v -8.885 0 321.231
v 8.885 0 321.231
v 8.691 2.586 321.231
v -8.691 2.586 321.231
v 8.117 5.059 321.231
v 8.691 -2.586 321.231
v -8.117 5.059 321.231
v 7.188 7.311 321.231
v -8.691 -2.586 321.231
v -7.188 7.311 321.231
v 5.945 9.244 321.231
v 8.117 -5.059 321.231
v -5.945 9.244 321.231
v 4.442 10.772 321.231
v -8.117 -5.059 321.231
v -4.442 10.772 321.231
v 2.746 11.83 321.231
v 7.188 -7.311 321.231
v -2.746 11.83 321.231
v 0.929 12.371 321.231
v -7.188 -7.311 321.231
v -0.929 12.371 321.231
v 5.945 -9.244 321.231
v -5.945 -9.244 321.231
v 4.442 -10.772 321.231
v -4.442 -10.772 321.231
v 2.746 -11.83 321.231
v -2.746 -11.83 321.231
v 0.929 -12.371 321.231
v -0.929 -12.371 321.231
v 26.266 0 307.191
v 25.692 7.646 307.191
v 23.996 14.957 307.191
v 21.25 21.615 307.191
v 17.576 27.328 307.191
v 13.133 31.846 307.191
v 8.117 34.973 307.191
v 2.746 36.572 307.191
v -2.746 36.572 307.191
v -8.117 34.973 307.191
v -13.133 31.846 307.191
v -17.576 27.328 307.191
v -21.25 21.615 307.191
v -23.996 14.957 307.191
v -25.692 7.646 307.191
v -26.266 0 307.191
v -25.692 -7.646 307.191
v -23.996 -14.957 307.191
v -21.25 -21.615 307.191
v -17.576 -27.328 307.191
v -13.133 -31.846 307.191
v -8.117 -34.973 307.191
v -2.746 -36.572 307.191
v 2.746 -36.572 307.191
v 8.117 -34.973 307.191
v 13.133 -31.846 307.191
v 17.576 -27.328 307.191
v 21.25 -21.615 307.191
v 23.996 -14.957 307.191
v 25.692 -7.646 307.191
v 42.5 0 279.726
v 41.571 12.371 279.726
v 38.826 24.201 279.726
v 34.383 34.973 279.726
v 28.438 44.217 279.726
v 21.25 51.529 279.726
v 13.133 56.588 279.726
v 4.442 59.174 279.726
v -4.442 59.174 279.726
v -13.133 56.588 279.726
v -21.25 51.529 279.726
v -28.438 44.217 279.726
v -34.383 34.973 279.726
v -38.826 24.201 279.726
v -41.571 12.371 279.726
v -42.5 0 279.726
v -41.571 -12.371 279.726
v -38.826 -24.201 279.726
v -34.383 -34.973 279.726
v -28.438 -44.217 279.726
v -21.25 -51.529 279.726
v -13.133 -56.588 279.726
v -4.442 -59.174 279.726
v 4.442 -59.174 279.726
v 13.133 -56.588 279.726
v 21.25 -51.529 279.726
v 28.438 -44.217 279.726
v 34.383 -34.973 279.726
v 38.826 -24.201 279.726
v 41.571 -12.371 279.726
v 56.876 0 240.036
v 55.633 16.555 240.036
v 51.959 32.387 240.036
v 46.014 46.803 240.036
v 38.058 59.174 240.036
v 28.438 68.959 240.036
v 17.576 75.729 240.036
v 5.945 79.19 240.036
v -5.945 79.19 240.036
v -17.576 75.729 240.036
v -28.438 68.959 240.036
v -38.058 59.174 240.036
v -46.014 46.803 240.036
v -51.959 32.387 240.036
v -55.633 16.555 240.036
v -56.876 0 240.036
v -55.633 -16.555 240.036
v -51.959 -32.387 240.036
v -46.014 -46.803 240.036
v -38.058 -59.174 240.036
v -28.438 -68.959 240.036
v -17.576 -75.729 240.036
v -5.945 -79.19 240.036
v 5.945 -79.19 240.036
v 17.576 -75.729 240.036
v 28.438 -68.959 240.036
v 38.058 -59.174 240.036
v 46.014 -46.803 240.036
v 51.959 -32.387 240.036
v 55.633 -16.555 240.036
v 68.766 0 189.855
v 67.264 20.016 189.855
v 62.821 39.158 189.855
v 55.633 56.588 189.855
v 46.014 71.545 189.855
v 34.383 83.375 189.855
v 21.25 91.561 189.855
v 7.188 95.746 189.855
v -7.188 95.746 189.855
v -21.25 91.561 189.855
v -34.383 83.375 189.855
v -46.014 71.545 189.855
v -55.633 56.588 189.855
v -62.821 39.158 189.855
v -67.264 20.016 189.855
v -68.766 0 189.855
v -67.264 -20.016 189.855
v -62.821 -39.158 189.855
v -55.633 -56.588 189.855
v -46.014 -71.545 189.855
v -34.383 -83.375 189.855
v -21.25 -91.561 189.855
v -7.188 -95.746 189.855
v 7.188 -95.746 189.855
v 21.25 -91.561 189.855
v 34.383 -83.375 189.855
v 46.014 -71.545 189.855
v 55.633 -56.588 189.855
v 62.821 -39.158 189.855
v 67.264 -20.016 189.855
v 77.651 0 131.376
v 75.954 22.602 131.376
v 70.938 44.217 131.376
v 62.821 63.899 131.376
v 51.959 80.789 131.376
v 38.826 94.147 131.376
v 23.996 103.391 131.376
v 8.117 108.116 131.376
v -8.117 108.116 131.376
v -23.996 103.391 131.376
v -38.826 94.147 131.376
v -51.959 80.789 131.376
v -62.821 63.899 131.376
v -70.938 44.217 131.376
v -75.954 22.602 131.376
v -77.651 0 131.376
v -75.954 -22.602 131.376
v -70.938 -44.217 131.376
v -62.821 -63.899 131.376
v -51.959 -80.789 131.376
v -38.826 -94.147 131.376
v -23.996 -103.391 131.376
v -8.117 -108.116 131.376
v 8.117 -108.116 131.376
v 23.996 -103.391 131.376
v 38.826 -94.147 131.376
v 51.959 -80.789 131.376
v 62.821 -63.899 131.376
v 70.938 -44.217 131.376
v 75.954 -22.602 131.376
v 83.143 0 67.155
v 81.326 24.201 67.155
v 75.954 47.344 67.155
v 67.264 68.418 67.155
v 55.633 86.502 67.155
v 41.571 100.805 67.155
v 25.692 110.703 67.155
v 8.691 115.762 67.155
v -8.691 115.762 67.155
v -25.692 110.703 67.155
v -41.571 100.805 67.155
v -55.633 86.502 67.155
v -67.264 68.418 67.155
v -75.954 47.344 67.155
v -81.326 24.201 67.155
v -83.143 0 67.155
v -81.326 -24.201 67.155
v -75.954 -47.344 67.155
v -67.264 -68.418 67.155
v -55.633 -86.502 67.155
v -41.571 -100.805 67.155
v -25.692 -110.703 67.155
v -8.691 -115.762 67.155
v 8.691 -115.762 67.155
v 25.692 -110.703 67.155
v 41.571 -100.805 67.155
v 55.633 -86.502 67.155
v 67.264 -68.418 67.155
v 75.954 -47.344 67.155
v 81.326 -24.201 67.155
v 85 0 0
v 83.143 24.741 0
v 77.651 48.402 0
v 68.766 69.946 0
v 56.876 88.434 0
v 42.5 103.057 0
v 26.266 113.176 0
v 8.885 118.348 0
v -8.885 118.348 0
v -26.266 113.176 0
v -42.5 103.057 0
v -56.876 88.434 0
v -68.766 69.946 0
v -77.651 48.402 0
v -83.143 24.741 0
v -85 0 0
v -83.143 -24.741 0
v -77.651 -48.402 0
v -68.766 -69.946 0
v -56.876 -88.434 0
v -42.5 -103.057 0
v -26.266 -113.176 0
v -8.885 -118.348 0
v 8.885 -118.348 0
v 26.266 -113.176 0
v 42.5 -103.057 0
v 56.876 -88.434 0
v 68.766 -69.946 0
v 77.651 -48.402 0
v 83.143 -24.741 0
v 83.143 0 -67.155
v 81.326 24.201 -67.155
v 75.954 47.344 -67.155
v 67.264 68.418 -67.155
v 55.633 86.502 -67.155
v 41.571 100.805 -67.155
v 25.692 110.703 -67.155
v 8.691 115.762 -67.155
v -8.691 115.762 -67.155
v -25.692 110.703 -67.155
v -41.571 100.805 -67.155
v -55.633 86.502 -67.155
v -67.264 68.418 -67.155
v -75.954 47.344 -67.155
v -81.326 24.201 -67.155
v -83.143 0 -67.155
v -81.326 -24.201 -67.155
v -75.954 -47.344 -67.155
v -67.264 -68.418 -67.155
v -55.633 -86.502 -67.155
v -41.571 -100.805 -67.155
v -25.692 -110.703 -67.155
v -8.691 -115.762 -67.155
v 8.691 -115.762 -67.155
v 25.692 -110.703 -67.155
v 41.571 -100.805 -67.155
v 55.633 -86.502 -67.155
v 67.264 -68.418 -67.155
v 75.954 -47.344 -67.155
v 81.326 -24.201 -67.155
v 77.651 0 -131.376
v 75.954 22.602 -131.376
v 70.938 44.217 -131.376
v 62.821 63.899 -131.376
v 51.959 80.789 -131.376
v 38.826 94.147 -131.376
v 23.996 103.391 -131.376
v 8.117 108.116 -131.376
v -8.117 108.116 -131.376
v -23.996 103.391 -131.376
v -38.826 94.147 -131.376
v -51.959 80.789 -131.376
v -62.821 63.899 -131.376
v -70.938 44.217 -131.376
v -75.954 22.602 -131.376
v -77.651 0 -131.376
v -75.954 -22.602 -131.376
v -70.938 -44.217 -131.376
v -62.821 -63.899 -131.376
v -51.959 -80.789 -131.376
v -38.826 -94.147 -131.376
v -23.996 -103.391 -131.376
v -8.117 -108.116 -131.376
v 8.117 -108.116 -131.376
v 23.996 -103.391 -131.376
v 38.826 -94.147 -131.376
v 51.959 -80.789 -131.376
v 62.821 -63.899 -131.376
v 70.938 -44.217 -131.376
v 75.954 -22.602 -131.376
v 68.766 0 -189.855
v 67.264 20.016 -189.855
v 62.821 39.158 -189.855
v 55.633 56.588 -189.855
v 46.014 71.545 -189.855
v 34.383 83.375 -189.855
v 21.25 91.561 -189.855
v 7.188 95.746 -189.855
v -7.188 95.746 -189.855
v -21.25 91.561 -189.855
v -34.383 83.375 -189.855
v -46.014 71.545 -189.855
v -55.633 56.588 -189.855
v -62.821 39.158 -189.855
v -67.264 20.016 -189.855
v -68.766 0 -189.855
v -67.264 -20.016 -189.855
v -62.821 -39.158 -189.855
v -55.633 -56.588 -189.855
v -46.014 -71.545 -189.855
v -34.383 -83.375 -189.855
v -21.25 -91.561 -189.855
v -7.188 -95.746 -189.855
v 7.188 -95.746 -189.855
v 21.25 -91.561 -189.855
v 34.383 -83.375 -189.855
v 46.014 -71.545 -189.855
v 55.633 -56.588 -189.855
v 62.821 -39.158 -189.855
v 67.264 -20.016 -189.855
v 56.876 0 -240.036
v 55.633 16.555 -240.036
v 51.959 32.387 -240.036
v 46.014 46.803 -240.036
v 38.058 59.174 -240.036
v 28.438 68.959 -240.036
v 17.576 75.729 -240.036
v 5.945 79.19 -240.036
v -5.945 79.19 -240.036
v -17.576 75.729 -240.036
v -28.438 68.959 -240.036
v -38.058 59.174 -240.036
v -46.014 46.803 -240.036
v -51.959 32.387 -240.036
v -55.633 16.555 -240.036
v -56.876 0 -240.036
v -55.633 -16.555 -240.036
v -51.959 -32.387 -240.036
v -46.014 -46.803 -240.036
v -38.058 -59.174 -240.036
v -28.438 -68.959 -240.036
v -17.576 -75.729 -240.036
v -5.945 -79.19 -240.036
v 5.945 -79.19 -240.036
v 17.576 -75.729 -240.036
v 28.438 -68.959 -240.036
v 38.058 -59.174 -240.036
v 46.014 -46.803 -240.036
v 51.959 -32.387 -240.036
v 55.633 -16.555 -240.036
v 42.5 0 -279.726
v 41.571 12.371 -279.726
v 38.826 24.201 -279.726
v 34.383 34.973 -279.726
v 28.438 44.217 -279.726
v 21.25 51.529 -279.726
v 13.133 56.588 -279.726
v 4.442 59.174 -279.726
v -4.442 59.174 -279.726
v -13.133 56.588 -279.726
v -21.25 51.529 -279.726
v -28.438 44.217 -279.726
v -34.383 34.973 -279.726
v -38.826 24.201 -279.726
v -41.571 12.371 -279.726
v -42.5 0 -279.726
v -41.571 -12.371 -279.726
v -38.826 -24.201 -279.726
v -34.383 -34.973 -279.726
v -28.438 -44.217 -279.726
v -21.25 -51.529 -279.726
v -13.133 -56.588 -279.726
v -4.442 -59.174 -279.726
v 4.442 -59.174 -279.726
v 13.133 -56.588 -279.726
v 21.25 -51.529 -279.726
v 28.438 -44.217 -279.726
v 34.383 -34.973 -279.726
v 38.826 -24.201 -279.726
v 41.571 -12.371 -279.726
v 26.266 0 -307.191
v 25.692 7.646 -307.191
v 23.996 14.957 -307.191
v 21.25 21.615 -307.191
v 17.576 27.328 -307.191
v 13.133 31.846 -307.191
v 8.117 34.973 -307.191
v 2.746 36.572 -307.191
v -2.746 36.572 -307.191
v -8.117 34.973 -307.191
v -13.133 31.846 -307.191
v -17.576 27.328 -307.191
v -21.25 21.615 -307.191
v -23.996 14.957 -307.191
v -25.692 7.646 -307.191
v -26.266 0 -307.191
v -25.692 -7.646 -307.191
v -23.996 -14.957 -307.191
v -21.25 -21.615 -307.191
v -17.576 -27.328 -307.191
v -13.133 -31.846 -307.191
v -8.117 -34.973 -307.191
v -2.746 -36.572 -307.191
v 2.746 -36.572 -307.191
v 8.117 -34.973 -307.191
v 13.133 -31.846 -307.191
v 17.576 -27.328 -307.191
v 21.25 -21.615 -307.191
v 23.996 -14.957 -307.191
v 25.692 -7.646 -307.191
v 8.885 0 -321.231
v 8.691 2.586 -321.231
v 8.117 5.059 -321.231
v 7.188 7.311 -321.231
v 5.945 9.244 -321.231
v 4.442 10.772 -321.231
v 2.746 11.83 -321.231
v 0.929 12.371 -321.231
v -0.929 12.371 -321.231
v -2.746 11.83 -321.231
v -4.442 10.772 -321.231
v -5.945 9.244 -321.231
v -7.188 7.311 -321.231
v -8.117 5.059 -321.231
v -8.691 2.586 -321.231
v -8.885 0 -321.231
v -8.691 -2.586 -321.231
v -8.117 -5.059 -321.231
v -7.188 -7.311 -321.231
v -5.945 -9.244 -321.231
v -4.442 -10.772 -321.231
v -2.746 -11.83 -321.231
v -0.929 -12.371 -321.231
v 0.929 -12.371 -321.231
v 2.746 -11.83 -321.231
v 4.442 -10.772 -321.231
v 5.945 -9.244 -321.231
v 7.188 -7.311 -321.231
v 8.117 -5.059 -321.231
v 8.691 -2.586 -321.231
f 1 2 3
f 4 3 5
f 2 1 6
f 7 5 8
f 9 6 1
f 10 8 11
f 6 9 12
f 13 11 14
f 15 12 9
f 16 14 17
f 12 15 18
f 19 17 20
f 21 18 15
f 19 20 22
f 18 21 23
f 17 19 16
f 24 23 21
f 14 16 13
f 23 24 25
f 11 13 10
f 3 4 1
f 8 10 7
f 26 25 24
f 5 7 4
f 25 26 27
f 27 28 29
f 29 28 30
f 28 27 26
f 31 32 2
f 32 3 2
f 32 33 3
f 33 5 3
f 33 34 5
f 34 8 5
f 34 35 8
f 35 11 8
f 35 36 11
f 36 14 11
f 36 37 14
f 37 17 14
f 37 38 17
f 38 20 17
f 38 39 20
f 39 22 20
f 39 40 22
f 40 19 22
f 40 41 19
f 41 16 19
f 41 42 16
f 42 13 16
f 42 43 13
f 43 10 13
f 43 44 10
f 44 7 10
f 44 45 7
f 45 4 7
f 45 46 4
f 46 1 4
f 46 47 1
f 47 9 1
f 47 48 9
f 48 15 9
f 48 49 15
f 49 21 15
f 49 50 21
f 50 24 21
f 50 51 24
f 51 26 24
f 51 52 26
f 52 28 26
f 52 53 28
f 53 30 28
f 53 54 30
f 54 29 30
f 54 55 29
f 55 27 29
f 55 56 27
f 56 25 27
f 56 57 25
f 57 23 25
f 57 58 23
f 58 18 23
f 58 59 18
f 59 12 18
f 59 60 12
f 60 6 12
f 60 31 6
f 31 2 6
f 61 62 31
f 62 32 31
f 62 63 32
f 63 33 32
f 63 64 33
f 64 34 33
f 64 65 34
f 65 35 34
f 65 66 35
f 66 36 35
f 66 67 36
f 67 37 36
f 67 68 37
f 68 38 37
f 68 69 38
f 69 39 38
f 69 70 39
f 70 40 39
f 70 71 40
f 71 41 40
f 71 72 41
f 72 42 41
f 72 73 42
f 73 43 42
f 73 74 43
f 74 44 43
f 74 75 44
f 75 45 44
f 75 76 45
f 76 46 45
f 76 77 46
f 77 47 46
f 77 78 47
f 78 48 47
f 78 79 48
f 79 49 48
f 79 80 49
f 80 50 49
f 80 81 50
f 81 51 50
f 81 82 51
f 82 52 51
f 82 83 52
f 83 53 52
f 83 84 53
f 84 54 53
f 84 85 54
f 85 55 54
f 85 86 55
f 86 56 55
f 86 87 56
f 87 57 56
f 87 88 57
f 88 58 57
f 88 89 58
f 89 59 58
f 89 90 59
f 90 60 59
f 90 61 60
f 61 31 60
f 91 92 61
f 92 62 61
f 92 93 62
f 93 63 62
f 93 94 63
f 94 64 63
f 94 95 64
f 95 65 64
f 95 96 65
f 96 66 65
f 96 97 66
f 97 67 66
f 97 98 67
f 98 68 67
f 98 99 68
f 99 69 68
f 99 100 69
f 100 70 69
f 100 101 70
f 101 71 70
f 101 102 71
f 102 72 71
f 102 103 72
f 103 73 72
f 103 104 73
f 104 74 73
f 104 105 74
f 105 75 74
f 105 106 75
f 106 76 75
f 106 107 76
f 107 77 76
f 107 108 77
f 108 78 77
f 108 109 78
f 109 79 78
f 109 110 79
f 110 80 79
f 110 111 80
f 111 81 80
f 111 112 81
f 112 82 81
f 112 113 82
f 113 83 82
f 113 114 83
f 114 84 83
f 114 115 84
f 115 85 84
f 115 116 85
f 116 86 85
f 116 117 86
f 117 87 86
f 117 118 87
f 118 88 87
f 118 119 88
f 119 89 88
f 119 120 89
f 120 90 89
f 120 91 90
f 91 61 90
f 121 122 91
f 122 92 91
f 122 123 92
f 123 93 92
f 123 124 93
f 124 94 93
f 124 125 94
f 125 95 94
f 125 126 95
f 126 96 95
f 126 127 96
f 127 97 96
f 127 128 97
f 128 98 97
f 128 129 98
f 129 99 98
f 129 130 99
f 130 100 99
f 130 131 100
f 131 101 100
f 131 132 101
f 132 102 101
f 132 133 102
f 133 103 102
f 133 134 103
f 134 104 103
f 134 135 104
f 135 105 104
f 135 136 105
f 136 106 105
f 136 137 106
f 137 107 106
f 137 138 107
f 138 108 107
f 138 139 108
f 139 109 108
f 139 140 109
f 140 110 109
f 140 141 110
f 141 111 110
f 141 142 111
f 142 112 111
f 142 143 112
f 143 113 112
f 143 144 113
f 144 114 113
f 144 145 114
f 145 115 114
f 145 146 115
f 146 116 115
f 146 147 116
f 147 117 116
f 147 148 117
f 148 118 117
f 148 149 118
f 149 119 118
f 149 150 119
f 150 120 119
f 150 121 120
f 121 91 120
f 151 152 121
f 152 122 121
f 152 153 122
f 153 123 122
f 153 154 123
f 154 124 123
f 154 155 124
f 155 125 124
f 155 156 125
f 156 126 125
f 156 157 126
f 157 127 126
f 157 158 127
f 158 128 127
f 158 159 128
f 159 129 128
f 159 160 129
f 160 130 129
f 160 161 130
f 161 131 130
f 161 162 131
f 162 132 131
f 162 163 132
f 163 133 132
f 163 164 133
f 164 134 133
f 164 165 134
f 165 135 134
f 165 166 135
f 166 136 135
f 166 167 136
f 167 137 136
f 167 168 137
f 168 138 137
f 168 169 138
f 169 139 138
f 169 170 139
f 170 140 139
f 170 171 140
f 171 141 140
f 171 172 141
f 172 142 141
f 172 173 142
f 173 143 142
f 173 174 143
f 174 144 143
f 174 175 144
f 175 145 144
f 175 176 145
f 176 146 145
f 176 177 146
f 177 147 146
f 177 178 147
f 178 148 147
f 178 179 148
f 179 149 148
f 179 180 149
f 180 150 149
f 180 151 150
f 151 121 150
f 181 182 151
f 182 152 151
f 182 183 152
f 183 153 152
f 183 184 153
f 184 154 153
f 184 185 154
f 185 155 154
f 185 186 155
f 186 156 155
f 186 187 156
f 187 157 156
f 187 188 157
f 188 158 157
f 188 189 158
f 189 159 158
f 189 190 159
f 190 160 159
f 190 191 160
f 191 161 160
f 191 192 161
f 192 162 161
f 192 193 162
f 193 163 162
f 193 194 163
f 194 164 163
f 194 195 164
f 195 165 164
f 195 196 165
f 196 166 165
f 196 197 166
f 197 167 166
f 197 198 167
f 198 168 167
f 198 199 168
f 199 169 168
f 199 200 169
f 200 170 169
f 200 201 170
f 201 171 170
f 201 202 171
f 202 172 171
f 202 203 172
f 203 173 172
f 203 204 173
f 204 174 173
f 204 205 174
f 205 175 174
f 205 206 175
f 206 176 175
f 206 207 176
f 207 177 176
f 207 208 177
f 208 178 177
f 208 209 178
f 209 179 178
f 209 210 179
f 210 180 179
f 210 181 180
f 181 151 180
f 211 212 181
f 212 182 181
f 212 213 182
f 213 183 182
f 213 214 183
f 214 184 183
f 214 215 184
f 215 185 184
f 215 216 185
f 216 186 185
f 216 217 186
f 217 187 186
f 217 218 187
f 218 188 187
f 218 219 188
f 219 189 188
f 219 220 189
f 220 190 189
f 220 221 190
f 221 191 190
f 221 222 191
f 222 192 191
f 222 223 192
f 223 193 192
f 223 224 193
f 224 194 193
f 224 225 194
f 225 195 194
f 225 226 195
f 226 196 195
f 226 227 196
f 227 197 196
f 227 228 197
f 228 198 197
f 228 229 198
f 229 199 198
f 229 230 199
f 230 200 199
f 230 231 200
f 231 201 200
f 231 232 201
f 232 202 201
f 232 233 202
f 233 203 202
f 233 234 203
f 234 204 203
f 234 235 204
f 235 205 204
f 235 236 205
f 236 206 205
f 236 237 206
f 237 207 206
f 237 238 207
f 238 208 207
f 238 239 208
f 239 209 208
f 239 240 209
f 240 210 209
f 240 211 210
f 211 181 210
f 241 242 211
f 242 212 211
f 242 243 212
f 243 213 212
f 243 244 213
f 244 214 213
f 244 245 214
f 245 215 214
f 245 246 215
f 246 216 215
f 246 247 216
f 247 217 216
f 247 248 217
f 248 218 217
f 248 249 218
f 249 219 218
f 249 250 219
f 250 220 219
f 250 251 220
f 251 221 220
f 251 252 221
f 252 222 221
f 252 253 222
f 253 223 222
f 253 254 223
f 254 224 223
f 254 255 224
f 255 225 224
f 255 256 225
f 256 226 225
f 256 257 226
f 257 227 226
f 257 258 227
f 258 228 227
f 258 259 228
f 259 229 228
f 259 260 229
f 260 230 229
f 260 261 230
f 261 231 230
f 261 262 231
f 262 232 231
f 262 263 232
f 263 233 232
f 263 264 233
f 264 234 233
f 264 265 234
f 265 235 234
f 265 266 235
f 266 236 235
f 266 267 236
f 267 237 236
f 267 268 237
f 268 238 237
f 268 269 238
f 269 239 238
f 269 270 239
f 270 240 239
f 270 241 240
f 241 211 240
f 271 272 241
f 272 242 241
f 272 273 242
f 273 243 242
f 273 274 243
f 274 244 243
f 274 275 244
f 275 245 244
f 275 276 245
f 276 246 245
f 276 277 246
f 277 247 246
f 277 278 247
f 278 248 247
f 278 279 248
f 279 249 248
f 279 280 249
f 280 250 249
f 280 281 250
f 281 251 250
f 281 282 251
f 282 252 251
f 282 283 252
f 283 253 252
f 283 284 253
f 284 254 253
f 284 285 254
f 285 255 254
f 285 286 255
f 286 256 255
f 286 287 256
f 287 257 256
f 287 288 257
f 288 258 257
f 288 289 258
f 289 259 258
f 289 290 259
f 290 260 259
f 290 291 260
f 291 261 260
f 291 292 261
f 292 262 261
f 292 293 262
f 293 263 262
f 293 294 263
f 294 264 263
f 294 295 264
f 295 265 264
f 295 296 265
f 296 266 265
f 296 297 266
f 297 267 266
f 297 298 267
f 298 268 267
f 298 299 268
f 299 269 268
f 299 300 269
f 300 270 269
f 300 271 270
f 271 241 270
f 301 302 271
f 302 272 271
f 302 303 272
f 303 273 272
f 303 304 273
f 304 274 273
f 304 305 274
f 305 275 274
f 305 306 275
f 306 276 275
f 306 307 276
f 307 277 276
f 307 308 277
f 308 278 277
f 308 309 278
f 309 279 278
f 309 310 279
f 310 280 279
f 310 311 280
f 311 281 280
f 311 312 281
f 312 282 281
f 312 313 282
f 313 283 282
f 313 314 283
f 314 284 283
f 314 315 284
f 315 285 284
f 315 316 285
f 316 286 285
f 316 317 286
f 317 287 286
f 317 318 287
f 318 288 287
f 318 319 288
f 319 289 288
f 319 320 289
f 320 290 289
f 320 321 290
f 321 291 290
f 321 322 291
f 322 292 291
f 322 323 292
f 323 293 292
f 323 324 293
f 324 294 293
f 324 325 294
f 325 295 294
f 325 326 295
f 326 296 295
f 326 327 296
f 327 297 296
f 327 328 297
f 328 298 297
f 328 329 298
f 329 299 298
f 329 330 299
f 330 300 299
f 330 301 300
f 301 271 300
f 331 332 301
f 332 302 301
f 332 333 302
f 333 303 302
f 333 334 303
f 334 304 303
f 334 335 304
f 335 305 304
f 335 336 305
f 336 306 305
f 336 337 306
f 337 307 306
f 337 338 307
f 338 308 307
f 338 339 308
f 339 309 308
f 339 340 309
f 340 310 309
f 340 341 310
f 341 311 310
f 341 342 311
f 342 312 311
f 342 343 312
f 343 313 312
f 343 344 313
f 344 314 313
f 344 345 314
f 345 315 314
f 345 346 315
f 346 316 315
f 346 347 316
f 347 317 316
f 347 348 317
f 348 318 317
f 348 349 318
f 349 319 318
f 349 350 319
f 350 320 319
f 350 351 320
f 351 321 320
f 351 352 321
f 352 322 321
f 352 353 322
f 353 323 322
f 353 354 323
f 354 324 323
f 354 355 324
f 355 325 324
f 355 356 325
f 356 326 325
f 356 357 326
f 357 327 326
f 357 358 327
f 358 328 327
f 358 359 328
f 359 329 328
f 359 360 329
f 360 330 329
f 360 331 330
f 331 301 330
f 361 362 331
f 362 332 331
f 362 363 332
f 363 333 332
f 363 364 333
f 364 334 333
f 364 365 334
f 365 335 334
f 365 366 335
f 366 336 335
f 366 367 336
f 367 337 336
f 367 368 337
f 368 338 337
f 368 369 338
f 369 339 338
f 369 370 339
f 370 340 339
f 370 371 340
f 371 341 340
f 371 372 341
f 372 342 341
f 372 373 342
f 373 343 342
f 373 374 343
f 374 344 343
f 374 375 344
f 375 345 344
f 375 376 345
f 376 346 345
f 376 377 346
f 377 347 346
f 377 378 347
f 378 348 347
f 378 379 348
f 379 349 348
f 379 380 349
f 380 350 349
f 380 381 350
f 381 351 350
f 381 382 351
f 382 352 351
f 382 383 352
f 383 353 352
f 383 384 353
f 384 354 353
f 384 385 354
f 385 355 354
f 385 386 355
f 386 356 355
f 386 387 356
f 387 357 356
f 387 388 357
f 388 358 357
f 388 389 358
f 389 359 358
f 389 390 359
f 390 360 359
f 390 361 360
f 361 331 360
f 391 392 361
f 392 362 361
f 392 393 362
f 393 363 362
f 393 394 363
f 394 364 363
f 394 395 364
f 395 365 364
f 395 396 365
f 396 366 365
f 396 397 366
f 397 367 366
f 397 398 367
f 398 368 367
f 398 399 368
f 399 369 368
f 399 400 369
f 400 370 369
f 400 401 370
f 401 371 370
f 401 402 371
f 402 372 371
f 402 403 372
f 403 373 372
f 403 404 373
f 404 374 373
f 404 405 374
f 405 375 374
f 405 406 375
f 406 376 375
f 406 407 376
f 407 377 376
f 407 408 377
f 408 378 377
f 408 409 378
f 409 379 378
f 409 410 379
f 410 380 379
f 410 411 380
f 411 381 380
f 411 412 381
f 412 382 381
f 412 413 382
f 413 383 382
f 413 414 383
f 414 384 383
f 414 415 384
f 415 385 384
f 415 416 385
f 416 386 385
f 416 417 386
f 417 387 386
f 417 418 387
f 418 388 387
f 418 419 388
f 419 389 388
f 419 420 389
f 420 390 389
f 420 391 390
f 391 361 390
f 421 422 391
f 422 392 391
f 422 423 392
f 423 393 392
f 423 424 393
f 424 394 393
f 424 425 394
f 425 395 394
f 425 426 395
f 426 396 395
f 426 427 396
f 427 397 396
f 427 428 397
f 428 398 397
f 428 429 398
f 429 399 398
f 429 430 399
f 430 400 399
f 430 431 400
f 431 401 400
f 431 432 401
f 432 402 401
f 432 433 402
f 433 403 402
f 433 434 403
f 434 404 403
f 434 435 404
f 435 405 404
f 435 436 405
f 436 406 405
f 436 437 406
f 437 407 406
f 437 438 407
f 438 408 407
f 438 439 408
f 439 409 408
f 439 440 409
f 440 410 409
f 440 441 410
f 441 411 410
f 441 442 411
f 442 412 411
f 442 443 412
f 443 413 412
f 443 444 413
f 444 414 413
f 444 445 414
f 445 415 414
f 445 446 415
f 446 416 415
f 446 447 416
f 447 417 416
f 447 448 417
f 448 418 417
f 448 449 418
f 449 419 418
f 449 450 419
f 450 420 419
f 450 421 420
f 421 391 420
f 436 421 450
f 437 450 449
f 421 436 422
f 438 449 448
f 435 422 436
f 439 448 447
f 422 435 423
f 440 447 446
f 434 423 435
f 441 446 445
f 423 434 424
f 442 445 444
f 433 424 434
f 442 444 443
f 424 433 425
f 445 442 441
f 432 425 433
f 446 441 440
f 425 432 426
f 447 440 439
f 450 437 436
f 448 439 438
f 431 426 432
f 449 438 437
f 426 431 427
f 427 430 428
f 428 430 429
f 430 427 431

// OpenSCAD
// Generated by SolidPython 1.0.1 on 2020-07-29 00:46:46


scale(v = [5, 7, 19]) {
	sphere(r = 17);
}
/***********************************************
*********      SolidPython code:      **********
************************************************
 
# import packages: SolidPython
from solid import *
from solid.utils import *
from itertools import chain, combinations, permutations


class Resize:

    def __init__(self, scad_file):
        self.scad_file = scad_file
        #self.scad_file = import_scad(scad_file)
        # cone/cylinder param:
        self.r1 = 0
        self.r2 = 0
        self.h = 0
        # rectangular prism param:
        self.w = 0
        self.l = 0
        # ellipse param:
        self.r = 0

    # import OpenScad code (file name corresponds to shape)


    # classify shape + parameters
    def assign(self, param1, param2, param3):
        if self.scad_file == 'cone.scad':
            self.r1 = param1
            self.r2 = param2
            self.h = param3
        elif self.scad_file == 'cylinder.scad':
            self.r1 = param1
            self.r2 = param2
            self.h = param3
        elif self.scad_file == 'rectangularPrism.scad':
            self.h = param1
            self.l = param2
            self.w = param3
        else:
            self.r = param1
            self.h = param2

    # resize parameters
    def iterate(self):
        x = range(3, 20, 2)
        i = 1
        if self.scad_file == 'cone.scad':
            tempList = list(permutations(x, 2))
            for temp in tempList:
                param1 = temp[0]
                param2 = temp[1]
                filepath = 'produced_scad_files/' + 'cone' + str(param1) + '_' + str(param2) + '_' + '.scad'
                scad_render_to_file(cylinder(h=param1, r1=param2, r2=0), filepath)

        elif self.scad_file == 'cylinder.scad':
            tempList = list(permutations(x, 3))
            for temp in tempList:
                param1 = temp[0]
                param2 = temp[1]
                filepath = 'produced_scad_files/' + 'cylinder' + str(param1) + '_' + str(param2) + '_' + '.scad'
                scad_render_to_file(cylinder(h=param1, r1=param2, r2=param2), filepath)

        elif self.scad_file == 'rectangularPrism.scad':
            tempList = list(permutations(x, 3))
            for temp in tempList:
                param1 = temp[0]
                param2 = temp[1]
                param3 = temp[2]
                filepath = 'produced_scad_files/' + 'rectangularPrism' + str(param1) + '_' + str(param2) + '_' + str(
                    param3) + '.scad'
                scad_render_to_file(cube(size=(param1, param2, param3)), filepath)

        elif self.scad_file == 'ellipse.scad':
            tempList = list(permutations(x, 4))
            for temp in tempList:
                param1 = temp[0]
                param2 = temp[1]
                param3 = temp[2]
                param4 = temp[3]
                filepath = 'produced_scad_files/' + 'ellipse' + str(param1) + '_' + str(param2) + '_' + str(param3) + '_' + str(param4) + '.scad'
                scad_render_to_file(scale([param1, param2, param3])(sphere(r=param4)), filepath)

    def render_to_scadfile(self):
        scad_render_to_file(scad, 'example.scad') 
 
************************************************/
